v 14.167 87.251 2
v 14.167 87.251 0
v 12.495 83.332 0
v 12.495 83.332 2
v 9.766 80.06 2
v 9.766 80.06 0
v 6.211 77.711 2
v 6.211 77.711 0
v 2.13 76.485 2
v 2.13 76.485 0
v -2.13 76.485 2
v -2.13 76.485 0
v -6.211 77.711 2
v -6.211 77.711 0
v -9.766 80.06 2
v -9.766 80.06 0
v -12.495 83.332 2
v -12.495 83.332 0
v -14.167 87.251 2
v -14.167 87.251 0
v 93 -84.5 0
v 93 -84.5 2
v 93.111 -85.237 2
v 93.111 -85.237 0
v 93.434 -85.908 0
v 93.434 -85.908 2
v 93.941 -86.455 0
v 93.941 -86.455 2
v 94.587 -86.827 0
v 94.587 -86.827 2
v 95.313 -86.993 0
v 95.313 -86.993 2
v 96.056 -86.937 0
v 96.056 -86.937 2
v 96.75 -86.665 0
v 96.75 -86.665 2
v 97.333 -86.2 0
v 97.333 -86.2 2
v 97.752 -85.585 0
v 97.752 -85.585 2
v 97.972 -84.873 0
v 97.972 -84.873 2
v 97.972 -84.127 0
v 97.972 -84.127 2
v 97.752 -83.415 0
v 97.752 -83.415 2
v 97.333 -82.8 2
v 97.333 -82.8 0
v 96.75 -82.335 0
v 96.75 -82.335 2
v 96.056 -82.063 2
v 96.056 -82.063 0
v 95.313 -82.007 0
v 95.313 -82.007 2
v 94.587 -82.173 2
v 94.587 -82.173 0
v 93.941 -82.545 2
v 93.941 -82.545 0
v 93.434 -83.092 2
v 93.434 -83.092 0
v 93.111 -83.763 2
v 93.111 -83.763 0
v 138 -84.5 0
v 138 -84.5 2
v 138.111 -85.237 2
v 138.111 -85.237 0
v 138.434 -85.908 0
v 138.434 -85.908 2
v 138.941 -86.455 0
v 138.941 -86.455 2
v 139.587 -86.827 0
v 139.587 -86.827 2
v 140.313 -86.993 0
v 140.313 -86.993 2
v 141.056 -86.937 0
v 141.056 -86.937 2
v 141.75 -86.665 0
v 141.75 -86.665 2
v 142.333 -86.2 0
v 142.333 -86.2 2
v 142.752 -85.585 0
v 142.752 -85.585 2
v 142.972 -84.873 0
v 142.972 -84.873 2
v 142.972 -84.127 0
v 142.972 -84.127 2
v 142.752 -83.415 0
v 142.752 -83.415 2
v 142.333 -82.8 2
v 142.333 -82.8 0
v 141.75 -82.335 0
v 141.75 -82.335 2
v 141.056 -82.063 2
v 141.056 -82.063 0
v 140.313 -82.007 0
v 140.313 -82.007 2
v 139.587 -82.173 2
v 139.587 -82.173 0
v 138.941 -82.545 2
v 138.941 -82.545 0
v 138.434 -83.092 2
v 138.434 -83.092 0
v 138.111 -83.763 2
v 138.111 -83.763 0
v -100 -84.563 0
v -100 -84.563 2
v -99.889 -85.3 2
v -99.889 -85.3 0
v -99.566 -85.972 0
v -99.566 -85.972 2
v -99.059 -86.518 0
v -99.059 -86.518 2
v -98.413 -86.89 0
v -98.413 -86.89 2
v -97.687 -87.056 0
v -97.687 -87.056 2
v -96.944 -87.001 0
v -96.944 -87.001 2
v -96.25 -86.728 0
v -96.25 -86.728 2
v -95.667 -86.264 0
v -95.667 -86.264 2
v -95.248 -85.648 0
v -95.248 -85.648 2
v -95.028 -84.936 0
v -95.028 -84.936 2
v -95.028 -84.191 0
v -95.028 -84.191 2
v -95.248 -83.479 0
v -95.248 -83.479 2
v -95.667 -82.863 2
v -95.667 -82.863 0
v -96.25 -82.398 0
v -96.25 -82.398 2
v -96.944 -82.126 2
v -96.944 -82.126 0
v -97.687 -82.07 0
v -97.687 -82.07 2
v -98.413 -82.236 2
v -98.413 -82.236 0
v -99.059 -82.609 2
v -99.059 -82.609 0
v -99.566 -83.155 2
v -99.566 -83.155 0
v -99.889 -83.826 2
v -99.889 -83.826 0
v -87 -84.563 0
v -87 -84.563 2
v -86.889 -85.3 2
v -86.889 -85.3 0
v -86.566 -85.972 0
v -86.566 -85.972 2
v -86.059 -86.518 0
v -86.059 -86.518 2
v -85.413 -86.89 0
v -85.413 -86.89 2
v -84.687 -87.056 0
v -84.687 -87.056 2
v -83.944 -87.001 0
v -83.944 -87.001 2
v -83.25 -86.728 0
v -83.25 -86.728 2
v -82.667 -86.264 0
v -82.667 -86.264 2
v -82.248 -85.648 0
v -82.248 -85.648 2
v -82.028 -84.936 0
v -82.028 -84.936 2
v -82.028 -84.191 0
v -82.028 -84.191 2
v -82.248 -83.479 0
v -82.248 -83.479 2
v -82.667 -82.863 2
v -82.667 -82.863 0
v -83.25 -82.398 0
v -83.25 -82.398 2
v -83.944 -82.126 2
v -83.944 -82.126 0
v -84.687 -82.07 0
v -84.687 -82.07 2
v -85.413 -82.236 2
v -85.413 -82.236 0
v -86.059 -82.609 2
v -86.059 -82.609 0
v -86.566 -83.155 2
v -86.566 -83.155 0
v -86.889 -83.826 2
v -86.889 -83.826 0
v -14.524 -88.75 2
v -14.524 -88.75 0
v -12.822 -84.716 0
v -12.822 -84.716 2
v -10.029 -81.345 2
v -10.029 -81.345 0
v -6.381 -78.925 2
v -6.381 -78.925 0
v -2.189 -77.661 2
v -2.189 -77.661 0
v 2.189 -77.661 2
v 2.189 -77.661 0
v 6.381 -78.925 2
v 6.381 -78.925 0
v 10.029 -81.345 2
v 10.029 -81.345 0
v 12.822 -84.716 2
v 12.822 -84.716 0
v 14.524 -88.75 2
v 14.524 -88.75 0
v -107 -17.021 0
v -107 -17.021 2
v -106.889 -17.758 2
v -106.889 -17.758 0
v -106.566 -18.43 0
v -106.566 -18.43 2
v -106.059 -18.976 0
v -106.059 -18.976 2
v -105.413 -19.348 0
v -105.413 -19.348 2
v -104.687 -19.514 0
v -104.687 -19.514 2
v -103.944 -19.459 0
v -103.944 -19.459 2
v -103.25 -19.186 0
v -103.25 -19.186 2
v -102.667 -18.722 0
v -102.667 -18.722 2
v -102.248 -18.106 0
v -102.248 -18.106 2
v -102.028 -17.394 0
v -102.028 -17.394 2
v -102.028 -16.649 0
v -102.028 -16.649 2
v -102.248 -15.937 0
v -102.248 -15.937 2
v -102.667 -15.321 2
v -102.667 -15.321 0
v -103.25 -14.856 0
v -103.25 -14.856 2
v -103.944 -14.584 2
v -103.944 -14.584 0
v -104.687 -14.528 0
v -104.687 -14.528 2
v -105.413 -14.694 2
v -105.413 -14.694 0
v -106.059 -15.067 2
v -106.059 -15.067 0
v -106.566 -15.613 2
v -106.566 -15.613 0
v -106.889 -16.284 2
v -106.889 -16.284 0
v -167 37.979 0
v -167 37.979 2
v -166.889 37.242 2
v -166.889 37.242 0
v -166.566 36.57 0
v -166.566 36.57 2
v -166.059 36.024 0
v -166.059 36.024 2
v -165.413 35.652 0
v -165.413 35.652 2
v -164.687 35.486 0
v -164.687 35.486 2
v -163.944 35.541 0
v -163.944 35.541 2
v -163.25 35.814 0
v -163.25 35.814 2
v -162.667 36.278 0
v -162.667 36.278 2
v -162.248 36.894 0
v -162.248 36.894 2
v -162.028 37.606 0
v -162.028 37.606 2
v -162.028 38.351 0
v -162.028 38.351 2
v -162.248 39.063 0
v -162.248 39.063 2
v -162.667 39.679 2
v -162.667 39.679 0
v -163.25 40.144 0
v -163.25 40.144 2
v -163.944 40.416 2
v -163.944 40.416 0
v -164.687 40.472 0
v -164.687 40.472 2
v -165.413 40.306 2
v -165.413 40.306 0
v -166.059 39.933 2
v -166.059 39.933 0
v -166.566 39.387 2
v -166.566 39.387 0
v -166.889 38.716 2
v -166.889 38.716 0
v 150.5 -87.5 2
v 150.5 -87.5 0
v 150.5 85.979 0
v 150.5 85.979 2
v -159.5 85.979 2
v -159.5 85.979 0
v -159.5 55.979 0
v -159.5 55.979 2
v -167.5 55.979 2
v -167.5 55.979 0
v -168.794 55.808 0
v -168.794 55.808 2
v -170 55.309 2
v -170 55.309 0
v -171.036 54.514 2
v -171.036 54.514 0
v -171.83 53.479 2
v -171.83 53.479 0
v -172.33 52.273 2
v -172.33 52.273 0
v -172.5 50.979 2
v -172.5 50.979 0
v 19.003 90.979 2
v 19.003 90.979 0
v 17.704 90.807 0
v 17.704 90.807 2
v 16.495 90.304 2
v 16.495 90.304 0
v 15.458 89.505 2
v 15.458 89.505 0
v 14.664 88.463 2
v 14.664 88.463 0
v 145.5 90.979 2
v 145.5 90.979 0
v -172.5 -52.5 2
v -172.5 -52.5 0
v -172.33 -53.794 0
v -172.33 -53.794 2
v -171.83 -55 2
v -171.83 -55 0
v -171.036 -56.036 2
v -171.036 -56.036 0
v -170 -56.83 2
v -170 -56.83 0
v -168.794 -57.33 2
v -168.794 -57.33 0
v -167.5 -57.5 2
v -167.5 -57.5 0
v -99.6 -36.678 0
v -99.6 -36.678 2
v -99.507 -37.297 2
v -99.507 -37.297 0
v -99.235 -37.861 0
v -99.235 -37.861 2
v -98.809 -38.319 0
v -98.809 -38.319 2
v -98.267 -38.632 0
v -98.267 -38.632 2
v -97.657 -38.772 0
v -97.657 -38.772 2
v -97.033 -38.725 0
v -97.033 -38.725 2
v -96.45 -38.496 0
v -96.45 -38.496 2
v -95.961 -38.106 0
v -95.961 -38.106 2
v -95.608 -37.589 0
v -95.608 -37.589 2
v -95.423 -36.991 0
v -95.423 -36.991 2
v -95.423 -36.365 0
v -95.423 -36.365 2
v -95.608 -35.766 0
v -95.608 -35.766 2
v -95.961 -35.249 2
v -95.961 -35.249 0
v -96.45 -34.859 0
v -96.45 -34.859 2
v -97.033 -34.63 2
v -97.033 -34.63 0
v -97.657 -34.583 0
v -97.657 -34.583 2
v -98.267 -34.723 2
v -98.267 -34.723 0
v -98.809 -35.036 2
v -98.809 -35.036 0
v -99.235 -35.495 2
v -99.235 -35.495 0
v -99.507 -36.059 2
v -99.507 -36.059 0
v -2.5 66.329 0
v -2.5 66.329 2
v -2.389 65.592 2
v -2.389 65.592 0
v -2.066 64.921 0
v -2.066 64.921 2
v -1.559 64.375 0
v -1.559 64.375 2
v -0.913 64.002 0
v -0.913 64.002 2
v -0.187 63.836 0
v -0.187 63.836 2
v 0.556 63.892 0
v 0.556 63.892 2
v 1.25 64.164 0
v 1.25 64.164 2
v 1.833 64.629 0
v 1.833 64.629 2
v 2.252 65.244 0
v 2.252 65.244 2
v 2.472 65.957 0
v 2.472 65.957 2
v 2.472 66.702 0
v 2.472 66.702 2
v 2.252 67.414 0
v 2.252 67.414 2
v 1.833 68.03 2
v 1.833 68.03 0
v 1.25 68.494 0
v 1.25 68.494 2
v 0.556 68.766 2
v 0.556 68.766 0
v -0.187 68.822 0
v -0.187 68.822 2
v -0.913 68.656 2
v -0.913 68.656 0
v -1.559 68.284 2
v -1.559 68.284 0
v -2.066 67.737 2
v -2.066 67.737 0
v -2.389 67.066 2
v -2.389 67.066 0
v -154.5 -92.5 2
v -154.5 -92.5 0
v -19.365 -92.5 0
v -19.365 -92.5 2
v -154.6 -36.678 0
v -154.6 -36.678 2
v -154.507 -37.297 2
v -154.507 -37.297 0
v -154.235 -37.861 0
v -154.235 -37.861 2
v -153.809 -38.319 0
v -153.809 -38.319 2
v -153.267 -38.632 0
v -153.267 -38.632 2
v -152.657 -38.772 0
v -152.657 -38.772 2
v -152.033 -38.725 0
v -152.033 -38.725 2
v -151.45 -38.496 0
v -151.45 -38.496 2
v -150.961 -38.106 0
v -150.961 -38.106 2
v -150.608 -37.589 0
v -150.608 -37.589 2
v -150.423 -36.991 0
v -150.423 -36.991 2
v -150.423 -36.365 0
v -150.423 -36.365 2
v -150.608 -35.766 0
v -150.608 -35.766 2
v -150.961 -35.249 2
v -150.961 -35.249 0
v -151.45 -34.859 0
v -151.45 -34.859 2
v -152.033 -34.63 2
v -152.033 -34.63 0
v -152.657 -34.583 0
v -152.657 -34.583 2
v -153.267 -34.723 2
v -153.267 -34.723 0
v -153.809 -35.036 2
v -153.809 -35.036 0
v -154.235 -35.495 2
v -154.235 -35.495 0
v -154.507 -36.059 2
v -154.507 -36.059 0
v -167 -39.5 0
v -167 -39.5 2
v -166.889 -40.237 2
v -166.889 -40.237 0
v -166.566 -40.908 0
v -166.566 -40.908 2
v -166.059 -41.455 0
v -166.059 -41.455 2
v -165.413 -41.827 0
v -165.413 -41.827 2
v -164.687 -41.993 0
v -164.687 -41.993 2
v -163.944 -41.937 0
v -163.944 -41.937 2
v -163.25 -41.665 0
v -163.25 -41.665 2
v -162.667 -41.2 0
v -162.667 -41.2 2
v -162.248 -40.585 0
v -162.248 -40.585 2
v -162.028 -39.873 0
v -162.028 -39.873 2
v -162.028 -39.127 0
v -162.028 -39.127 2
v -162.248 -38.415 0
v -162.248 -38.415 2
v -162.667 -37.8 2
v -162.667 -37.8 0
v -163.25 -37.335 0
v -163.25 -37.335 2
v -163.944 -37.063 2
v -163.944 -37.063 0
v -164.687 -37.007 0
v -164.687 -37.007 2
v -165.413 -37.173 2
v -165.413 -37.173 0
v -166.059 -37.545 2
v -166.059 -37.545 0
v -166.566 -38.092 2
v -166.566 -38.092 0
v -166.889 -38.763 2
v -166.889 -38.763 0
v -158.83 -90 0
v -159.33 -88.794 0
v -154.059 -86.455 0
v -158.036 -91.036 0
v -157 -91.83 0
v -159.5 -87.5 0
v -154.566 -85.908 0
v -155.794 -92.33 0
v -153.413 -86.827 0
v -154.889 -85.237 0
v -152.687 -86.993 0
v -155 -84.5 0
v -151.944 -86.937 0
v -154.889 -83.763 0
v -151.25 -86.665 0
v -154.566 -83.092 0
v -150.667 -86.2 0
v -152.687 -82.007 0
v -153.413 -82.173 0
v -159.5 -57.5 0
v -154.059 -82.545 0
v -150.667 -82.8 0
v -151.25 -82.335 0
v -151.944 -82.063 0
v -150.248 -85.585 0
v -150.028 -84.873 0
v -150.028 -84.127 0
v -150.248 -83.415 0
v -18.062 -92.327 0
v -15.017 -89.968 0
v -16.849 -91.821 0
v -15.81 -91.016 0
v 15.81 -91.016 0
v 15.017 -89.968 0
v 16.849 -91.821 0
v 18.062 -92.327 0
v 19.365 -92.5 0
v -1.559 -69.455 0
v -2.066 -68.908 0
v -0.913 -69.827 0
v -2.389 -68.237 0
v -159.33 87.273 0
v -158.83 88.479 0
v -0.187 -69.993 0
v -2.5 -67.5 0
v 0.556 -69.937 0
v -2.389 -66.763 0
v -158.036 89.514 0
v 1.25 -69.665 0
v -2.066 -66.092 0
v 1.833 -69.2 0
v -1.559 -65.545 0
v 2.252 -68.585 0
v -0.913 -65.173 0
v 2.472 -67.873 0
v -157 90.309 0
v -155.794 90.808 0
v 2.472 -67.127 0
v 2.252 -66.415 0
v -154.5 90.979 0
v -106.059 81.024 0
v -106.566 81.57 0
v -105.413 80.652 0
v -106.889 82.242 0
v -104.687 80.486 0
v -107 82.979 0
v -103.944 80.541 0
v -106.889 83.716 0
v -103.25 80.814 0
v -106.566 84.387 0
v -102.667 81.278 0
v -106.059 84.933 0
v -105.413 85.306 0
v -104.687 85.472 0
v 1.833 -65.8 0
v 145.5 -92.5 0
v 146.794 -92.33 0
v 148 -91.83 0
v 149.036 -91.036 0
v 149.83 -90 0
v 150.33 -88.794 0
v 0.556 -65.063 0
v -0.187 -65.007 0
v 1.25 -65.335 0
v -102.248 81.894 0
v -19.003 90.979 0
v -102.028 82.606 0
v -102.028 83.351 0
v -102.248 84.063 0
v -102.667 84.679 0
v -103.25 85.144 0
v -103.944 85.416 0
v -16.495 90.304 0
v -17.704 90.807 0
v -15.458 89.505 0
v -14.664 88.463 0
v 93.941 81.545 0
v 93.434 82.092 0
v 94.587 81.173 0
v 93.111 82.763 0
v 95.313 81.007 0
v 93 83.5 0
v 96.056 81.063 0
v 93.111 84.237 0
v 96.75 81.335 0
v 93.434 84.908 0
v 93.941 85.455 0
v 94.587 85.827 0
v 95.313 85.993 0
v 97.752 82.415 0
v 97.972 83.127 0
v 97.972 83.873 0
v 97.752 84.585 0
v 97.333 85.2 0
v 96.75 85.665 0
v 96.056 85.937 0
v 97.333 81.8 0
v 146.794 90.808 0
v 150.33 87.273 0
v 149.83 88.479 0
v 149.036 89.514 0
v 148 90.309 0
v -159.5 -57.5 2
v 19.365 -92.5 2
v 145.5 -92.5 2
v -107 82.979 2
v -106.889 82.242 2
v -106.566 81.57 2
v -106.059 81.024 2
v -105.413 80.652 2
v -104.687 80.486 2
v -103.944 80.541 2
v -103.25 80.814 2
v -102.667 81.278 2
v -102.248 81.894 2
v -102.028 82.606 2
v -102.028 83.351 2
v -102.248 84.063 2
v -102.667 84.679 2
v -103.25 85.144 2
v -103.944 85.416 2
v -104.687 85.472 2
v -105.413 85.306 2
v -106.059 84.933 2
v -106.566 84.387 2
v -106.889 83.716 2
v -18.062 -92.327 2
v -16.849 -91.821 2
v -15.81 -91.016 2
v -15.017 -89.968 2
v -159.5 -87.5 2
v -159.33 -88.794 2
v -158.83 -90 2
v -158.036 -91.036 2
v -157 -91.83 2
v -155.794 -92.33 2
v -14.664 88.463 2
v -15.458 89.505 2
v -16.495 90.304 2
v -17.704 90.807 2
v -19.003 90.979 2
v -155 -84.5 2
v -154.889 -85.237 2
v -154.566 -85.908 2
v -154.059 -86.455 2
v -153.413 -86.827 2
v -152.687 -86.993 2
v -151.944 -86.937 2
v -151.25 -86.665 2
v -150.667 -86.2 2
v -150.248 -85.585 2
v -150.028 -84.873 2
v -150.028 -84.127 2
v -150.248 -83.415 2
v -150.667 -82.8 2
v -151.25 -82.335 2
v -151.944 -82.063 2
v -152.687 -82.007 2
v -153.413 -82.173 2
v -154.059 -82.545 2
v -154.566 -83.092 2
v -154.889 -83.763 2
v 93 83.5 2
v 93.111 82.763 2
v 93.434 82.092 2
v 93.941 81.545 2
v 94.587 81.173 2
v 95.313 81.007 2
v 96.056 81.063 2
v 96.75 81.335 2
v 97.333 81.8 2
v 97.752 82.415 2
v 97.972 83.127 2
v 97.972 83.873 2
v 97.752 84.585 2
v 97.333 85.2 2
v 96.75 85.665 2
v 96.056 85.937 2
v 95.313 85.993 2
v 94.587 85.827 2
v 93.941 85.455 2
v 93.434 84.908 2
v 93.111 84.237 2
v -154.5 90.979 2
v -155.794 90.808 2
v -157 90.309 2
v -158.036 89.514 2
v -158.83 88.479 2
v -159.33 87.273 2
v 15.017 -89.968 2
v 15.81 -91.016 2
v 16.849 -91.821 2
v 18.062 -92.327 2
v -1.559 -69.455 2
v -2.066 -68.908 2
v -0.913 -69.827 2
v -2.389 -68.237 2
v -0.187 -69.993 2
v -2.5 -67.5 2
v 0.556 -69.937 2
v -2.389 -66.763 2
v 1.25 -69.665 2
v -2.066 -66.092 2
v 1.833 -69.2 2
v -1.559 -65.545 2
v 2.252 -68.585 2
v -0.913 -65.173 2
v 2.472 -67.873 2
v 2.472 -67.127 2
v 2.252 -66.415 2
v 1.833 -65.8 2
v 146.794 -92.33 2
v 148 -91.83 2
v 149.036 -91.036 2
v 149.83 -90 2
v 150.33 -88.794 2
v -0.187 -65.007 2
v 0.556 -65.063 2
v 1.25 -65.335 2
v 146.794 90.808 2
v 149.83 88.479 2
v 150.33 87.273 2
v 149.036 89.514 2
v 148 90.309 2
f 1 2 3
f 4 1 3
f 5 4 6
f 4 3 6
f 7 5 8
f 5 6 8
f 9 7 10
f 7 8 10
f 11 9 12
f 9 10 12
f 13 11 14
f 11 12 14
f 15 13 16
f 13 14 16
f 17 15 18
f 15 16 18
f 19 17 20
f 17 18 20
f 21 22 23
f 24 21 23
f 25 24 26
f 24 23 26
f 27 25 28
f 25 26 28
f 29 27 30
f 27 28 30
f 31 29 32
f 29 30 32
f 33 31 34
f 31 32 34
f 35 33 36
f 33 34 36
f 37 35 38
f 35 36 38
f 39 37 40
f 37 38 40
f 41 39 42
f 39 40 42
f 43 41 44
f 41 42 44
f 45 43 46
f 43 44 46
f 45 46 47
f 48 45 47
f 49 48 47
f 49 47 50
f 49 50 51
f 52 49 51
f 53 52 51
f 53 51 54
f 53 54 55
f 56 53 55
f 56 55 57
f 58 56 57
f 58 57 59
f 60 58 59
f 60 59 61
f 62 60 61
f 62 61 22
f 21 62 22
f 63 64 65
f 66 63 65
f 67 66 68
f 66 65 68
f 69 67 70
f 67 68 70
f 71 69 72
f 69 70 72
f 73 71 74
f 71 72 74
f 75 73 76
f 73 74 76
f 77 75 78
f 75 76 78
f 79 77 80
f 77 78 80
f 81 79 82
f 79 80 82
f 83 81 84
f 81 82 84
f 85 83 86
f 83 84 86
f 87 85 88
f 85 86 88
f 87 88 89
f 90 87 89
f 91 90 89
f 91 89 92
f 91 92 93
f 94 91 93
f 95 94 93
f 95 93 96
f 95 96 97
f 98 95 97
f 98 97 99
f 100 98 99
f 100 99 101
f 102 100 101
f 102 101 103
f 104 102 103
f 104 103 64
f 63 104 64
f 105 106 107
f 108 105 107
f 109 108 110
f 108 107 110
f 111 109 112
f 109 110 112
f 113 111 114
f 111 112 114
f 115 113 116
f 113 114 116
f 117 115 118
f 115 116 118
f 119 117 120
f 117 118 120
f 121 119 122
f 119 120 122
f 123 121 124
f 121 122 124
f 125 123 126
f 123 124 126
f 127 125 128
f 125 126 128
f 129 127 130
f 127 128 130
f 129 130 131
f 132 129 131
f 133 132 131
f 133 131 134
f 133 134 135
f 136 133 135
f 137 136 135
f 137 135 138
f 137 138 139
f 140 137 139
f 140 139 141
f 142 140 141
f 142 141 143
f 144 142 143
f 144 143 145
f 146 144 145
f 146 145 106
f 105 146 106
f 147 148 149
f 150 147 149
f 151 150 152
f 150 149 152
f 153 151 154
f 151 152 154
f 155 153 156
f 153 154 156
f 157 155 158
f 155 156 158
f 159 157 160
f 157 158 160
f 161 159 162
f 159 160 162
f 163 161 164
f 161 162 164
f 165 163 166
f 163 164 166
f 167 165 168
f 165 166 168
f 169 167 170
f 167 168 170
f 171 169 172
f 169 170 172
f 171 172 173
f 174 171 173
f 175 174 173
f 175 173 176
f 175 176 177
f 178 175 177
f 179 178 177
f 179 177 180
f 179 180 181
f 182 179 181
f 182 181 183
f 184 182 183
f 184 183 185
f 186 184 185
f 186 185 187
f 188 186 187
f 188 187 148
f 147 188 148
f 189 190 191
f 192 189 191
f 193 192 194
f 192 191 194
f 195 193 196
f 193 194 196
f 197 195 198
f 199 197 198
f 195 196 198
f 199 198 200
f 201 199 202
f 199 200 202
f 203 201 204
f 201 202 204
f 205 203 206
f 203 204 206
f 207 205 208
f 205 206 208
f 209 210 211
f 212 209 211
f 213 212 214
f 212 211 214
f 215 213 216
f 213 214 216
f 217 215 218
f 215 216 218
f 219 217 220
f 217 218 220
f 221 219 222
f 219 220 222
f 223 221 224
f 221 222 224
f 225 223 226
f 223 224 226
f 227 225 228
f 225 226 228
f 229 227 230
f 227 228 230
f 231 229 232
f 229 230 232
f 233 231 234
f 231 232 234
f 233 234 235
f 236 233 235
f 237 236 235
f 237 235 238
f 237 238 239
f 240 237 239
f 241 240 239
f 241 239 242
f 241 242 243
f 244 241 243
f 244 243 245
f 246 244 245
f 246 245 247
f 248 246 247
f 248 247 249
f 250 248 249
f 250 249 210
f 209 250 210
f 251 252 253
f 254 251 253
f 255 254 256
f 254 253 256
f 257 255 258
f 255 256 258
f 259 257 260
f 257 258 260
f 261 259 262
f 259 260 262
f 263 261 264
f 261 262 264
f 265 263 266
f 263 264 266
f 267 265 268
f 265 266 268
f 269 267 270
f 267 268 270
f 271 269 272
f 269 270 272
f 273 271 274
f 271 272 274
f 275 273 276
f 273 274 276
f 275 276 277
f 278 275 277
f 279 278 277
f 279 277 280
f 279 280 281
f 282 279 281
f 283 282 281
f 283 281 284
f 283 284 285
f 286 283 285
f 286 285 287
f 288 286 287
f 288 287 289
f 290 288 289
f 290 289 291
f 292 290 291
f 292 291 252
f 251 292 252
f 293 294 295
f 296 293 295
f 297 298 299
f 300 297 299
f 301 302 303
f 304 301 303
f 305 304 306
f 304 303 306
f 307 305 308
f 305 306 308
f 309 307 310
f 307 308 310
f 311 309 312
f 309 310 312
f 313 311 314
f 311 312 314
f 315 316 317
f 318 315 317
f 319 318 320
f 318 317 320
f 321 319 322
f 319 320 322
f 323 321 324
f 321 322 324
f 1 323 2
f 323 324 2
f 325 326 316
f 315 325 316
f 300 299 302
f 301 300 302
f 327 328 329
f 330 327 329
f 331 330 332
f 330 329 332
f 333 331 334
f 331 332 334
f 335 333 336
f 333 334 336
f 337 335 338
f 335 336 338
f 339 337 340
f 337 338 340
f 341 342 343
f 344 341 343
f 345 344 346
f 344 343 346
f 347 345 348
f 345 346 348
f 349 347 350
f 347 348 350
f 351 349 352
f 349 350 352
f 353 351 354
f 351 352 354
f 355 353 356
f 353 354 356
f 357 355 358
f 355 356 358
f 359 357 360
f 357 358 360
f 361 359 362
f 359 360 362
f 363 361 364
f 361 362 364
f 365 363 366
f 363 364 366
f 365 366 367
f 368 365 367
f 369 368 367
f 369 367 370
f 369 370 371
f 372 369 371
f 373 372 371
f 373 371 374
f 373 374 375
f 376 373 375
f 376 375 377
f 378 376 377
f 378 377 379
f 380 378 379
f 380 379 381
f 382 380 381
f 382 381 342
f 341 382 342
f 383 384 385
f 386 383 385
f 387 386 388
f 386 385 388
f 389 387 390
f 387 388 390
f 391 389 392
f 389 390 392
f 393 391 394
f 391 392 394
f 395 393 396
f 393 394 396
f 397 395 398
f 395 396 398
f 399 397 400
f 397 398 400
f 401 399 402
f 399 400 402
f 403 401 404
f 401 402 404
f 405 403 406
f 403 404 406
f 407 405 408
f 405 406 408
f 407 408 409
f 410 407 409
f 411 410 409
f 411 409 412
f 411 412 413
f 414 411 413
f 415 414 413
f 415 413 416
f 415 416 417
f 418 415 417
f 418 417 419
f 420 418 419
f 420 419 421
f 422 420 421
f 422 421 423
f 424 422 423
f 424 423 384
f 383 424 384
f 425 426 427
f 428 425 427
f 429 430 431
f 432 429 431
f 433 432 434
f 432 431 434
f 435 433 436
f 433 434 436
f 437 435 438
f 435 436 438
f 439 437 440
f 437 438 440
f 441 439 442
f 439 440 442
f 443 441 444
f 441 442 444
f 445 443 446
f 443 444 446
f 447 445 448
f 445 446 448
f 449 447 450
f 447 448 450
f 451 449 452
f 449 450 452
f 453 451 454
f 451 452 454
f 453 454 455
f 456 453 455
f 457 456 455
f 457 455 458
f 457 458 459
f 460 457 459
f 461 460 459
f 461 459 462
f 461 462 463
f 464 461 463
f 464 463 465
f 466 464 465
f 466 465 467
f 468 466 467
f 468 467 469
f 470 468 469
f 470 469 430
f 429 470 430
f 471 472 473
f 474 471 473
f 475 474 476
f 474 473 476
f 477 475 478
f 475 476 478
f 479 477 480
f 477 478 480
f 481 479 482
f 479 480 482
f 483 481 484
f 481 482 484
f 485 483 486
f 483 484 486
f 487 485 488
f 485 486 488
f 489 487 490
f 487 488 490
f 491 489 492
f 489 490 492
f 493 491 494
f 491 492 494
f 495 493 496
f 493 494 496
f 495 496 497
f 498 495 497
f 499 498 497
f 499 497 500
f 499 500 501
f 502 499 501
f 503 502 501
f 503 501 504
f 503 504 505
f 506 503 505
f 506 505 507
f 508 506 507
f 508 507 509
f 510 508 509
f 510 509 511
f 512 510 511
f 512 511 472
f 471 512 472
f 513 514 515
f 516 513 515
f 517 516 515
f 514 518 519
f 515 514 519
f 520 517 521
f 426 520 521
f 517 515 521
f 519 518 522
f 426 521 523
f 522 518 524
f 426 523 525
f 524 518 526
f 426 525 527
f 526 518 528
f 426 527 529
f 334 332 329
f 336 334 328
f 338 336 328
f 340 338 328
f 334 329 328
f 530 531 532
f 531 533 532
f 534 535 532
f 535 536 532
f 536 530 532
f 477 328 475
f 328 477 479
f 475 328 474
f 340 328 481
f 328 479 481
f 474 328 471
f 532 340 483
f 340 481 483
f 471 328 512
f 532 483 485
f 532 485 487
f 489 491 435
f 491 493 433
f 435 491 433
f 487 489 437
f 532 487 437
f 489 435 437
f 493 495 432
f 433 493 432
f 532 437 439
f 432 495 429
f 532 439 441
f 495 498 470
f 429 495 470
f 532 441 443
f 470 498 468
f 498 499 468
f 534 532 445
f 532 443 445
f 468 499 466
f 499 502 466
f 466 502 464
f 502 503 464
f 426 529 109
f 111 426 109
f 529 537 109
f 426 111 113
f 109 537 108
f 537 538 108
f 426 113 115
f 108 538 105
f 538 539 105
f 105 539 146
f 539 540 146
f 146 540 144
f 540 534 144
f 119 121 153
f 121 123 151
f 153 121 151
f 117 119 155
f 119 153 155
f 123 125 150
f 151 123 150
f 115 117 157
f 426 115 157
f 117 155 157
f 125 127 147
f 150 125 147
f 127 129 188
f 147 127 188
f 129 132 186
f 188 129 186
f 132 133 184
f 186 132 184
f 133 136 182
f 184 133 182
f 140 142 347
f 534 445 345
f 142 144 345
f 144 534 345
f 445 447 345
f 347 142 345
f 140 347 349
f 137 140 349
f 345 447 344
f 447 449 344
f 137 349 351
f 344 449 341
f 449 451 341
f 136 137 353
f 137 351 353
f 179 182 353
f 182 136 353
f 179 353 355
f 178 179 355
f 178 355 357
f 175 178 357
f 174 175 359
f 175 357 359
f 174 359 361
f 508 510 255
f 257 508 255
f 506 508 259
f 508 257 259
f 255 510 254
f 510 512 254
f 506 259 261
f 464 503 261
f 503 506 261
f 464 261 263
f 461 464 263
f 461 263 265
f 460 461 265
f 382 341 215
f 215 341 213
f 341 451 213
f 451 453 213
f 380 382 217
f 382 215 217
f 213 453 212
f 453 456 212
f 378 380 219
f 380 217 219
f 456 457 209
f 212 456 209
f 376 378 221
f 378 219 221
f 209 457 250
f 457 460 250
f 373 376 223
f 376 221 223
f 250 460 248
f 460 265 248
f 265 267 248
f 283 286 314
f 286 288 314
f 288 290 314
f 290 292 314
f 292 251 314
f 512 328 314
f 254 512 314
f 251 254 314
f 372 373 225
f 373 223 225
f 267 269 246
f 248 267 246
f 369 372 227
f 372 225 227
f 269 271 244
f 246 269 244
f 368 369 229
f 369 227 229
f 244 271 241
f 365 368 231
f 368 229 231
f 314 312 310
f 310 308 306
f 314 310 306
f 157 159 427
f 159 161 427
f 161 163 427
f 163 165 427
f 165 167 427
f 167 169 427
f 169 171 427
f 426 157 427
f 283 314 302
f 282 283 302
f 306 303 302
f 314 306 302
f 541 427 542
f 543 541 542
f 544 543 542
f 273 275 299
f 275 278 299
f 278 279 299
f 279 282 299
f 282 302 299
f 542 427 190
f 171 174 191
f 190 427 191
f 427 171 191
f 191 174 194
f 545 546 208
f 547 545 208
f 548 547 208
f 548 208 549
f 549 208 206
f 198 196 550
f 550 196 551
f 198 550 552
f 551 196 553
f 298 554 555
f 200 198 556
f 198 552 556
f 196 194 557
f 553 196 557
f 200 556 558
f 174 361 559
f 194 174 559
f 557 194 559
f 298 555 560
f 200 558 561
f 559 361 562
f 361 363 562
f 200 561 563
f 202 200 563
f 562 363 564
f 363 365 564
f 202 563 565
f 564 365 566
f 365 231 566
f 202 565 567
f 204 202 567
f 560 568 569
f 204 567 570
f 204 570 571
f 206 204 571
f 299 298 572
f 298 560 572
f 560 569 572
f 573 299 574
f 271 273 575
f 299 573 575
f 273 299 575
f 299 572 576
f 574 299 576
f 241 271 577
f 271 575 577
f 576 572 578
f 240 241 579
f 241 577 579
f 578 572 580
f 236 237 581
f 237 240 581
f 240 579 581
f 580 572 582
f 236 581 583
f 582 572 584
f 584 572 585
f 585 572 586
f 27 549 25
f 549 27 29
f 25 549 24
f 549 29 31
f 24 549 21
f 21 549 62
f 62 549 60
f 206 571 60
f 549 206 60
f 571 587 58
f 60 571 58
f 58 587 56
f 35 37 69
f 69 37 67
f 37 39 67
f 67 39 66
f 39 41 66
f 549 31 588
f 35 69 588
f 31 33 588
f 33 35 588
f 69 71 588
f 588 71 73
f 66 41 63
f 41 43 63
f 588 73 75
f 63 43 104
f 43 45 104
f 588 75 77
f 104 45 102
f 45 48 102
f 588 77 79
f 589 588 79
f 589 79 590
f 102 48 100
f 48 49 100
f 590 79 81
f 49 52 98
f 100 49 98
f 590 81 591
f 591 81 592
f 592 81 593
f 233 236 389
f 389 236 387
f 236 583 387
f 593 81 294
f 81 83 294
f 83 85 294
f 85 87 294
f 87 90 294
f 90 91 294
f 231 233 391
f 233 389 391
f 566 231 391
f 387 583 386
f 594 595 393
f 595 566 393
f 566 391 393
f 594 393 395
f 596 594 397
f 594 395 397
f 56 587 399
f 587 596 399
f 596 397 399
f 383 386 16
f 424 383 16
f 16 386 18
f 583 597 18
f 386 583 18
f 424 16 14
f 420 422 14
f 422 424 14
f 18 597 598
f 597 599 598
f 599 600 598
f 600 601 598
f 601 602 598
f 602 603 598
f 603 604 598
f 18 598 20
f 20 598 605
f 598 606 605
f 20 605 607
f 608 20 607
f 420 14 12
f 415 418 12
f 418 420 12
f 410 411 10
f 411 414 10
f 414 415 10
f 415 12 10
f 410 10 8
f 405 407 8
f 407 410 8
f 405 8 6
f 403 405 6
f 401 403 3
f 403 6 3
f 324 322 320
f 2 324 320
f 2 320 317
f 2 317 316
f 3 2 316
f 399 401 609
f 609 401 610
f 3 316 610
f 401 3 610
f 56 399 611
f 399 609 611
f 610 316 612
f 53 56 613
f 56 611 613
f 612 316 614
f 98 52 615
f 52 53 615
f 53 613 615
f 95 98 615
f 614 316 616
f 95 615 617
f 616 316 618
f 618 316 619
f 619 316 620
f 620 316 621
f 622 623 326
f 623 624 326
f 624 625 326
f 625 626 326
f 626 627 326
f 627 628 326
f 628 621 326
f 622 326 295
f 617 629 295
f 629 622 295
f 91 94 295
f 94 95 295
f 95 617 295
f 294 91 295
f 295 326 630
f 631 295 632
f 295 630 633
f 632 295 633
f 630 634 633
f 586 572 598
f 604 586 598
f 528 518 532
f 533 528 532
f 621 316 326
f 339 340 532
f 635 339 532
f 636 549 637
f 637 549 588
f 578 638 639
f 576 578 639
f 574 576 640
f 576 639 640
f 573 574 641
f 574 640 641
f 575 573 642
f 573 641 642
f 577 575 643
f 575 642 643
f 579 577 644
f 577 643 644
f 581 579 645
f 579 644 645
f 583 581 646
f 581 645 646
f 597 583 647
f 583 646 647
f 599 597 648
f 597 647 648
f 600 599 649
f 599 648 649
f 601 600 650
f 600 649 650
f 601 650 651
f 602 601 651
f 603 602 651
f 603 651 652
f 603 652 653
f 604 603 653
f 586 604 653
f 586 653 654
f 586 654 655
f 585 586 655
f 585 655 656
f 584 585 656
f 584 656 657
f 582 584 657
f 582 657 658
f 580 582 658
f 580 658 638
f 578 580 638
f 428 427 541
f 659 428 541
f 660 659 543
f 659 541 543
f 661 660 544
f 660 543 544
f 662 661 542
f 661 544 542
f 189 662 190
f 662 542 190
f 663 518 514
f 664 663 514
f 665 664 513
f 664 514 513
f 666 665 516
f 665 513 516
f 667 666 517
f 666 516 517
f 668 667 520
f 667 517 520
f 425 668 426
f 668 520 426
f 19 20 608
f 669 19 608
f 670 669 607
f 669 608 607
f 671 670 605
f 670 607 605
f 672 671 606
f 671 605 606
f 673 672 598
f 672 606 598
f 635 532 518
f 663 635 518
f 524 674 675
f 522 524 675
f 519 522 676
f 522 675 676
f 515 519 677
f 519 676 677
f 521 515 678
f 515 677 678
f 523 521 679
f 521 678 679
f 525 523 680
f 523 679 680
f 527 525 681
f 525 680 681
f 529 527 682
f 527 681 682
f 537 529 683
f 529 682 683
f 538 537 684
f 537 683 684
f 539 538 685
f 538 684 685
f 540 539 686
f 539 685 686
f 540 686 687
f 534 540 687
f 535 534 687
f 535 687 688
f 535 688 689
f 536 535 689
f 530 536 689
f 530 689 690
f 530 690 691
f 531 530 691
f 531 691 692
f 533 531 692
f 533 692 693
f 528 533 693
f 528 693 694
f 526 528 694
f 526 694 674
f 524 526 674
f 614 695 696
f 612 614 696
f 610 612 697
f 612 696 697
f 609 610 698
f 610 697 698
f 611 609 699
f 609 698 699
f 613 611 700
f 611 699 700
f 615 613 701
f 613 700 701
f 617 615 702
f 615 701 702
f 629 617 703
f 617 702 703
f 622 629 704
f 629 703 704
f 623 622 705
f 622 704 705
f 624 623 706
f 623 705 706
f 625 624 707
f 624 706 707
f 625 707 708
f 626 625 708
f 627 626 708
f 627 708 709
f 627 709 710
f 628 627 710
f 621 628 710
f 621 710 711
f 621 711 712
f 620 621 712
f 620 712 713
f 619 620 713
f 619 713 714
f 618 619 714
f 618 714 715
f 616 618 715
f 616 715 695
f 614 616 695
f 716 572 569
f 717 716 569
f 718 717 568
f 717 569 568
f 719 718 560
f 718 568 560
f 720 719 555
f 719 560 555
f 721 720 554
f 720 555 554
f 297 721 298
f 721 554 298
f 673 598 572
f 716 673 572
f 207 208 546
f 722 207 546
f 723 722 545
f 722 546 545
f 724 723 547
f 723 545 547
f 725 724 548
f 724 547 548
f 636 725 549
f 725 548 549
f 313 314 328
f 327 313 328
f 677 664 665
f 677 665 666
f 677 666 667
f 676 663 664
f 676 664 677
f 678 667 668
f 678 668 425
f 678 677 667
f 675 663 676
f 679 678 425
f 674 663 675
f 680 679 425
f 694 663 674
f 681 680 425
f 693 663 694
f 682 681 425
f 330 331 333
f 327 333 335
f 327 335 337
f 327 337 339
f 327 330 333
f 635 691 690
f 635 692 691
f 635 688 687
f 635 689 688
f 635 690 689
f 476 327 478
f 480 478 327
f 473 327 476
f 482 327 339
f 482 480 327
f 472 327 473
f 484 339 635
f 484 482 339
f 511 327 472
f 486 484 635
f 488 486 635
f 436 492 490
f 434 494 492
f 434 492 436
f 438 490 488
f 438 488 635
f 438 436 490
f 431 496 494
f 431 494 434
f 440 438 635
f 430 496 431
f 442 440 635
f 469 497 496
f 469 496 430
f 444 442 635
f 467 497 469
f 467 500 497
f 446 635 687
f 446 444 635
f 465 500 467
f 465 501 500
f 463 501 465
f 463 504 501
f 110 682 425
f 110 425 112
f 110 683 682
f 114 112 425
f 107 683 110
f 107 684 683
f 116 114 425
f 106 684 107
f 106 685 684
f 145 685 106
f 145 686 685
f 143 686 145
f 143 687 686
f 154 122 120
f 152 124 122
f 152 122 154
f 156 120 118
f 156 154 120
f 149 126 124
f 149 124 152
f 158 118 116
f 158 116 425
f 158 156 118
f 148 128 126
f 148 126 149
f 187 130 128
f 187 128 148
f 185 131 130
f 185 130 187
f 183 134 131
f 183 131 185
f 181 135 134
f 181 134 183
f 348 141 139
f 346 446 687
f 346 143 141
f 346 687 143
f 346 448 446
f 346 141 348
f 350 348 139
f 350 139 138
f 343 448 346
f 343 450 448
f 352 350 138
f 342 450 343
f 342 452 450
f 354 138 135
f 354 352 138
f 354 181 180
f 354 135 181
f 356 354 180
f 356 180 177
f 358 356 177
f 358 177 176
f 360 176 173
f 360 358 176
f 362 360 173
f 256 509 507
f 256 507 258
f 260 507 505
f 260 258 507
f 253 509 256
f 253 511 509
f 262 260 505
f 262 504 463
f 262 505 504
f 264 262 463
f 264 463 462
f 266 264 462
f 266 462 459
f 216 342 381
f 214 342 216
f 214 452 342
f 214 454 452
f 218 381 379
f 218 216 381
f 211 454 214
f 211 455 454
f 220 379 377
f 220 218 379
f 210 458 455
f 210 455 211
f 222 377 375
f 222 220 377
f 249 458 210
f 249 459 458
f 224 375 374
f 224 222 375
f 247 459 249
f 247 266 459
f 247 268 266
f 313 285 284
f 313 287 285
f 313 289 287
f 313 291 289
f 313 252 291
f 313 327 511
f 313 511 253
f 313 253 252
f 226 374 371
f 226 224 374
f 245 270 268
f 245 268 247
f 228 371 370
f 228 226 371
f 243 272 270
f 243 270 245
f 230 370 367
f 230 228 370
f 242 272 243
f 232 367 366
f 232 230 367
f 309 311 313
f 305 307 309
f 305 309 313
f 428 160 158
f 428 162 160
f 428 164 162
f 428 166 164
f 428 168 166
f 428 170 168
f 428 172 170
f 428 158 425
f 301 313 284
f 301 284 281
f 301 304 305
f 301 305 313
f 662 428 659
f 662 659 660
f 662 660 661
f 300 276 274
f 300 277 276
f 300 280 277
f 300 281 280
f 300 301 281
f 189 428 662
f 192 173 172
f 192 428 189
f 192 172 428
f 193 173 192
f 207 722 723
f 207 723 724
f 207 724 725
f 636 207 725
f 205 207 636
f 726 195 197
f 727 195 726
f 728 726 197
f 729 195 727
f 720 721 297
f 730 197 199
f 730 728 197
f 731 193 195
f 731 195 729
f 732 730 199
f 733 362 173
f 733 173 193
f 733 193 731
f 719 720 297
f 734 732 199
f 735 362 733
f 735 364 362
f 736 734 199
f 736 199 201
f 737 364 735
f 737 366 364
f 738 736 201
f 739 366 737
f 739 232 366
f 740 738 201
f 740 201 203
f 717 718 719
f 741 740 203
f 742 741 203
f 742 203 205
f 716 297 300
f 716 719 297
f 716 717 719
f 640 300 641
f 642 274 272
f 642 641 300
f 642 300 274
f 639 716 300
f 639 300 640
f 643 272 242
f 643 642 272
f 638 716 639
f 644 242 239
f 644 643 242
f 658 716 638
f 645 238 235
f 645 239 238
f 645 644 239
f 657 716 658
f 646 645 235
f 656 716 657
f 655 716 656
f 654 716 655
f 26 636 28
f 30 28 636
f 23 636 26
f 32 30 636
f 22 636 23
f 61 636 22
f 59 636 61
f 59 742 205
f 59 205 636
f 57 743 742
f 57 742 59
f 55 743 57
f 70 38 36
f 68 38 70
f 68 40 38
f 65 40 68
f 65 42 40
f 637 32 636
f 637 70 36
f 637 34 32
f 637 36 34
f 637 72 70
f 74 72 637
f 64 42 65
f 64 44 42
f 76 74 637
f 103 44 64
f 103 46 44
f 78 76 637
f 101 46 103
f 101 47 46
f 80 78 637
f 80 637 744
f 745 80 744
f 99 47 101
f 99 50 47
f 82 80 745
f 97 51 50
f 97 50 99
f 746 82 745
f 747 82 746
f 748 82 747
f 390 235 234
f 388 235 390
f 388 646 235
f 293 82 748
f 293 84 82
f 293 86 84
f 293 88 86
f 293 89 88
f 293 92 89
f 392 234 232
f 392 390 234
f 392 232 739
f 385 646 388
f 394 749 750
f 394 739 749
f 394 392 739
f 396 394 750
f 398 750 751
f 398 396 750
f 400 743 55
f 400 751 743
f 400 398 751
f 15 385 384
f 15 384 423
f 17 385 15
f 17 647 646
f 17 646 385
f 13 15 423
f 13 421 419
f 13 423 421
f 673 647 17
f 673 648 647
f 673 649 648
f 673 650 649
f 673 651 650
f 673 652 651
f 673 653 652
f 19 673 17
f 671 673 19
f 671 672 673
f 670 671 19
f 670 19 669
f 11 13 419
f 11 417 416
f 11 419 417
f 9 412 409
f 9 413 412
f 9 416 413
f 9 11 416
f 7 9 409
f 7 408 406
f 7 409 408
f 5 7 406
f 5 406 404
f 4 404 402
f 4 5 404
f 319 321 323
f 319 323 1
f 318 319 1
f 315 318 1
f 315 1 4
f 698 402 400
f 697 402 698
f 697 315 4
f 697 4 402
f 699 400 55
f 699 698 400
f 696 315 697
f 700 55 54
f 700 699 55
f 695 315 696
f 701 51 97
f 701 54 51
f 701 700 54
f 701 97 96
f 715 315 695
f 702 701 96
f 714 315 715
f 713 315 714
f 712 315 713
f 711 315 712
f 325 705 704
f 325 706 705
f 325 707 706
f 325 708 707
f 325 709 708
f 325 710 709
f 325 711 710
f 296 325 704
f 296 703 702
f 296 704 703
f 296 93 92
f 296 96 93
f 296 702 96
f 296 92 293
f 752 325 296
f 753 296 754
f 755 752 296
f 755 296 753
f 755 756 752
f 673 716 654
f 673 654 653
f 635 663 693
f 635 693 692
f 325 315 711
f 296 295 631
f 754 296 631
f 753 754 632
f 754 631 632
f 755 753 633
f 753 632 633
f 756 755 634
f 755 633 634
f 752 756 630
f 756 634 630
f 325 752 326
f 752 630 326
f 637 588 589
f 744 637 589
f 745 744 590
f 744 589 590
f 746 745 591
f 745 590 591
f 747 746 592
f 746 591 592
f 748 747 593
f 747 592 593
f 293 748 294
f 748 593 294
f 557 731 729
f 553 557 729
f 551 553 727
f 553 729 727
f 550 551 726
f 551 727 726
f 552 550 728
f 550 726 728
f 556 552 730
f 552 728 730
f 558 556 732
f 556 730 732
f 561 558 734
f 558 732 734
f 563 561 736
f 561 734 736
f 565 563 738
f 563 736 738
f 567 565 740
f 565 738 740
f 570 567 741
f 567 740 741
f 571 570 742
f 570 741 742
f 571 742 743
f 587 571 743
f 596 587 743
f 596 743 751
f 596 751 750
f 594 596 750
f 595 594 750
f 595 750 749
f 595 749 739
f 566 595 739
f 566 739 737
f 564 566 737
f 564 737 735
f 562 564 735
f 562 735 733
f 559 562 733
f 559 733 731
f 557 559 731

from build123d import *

# Parameters (mm, degrees)
F1_DEPTH = 2
F2_D     = 5
F2_DEPTH = 22.4
F2_TIP   = 1.5021515476
F3_D     = 4.2
F3_DEPTH = 22.4
F3_TIP   = 1.2618073
F4_D     = 5
F4_DEPTH = 22.4
F4_TIP   = 1.5021515476
F5_D     = 5
F5_DEPTH = 22.4
F5_TIP   = 1.5021515476


# Not quite as in the source:
# - a feature names something its author has since deleted; it is built from what else it names


with BuildPart() as f1:
    # F0 (on Top) → F1 (new body)
    with BuildSketch(Plane.XY):
        with BuildLine():
            Line((-19.0027786864, 90.978695631), (-154.5, 90.978695631))
            ThreePointArc((-154.5, 90.978695631), (-158.0355339059, 89.514229537), (-159.5, 85.978695631))
            Line((-159.5, 85.978695631), (-159.5, 55.978695631))
            Line((-159.5, 55.978695631), (-167.5, 55.978695631))
            ThreePointArc((-167.5, 55.978695631), (-171.0355339059, 54.514229537), (-172.5, 50.978695631))
            Line((-172.5, 50.978695631), (-172.5, -52.5))
            ThreePointArc((-172.5, -52.5), (-171.0355339059, -56.0355339059), (-167.5, -57.5))
            Line((-167.5, -57.5), (-159.5, -57.5))
            Line((-159.5, -57.5), (-159.5, -87.5))
            ThreePointArc((-159.5, -87.5), (-158.0355339059, -91.0355339059), (-154.5, -92.5))
            Line((-154.5, -92.5), (-19.364916731, -92.5))
            ThreePointArc((-19.364916731, -92.5), (-16.3030545526, -91.4528470752), (-14.5236875483, -88.75))
            ThreePointArc((-14.5236875483, -88.75), (0, -77.5), (14.5236875483, -88.75))
            ThreePointArc((14.5236875483, -88.75), (16.3030545526, -91.4528470752), (19.364916731, -92.5))
            Line((19.364916731, -92.5), (145.5, -92.5))
            ThreePointArc((145.5, -92.5), (149.0355339059, -91.0355339059), (150.5, -87.5))
            Line((150.5, -87.5), (150.5, 85.978695631))
            ThreePointArc((150.5, 85.978695631), (149.0355339059, 89.514229537), (145.5, 90.978695631))
            Line((145.5, 90.978695631), (19.0027786864, 90.978695631))
            ThreePointArc((19.0027786864, 90.978695631), (15.9500309398, 89.9385859319), (14.1673602092, 87.2509881092))
            ThreePointArc((14.1673602092, 87.2509881092), (0, 76.329125717), (-14.1673602092, 87.2509881092))
            ThreePointArc((-14.1673602092, 87.2509881092), (-15.9500309398, 89.9385859319), (-19.0027786864, 90.978695631))
        make_face()
    extrude(amount=F1_DEPTH)

    # F2
    with Locations(Plane(origin=(0, 0, 0), x_dir=(1, 0, 0), z_dir=(0, 0, -1))):
        with Locations((-104.5, -82.978695631), (95.5, -83.5), (162.5, -84.5), (140.5, 84.5), (95.5, 84.5), (-97.5, 84.5632106066), (-152.5, 84.5)):
            Hole(F2_D / 2, depth=F2_DEPTH)
            with Locations((0, 0, -(F2_DEPTH + F2_TIP / 2))):  # 118° drill point
                Cone(0, F2_D / 2, F2_TIP, mode=Mode.SUBTRACT)

    # F3
    with Locations(Plane(origin=(0, 0, 0), x_dir=(1, 0, 0), z_dir=(0, 0, -1))):
        with Locations((-97.5, 36.6775505245), (-152.5, 36.6775505245)):
            Hole(F3_D / 2, depth=F3_DEPTH)
            with Locations((0, 0, -(F3_DEPTH + F3_TIP / 2))):  # 118° drill point
                Cone(0, F3_D / 2, F3_TIP, mode=Mode.SUBTRACT)

    # F4
    with Locations(Plane(origin=(0, 0, 0), x_dir=(1, 0, 0), z_dir=(0, 0, -1))):
        with Locations((-164.5, -37.978695631), (-164.5, 39.5), (-104.5, 17.021304369), (0, 67.5), (0, -66.329125717), (95.5, -83.5), (95.5, 84.5), (140.5, 84.5), (162.5, -84.5)):
            Hole(F4_D / 2, depth=F4_DEPTH)
            with Locations((0, 0, -(F4_DEPTH + F4_TIP / 2))):  # 118° drill point
                Cone(0, F4_D / 2, F4_TIP, mode=Mode.SUBTRACT)

    # F5
    with Locations(Plane(origin=(0, 0, 0), x_dir=(1, 0, 0), z_dir=(0, 0, -1))):
        with Locations((-84.5, 84.5632106066)):
            Hole(F5_D / 2, depth=F5_DEPTH)
            with Locations((0, 0, -(F5_DEPTH + F5_TIP / 2))):  # 118° drill point
                Cone(0, F5_D / 2, F5_TIP, mode=Mode.SUBTRACT)


solid = f1.part
